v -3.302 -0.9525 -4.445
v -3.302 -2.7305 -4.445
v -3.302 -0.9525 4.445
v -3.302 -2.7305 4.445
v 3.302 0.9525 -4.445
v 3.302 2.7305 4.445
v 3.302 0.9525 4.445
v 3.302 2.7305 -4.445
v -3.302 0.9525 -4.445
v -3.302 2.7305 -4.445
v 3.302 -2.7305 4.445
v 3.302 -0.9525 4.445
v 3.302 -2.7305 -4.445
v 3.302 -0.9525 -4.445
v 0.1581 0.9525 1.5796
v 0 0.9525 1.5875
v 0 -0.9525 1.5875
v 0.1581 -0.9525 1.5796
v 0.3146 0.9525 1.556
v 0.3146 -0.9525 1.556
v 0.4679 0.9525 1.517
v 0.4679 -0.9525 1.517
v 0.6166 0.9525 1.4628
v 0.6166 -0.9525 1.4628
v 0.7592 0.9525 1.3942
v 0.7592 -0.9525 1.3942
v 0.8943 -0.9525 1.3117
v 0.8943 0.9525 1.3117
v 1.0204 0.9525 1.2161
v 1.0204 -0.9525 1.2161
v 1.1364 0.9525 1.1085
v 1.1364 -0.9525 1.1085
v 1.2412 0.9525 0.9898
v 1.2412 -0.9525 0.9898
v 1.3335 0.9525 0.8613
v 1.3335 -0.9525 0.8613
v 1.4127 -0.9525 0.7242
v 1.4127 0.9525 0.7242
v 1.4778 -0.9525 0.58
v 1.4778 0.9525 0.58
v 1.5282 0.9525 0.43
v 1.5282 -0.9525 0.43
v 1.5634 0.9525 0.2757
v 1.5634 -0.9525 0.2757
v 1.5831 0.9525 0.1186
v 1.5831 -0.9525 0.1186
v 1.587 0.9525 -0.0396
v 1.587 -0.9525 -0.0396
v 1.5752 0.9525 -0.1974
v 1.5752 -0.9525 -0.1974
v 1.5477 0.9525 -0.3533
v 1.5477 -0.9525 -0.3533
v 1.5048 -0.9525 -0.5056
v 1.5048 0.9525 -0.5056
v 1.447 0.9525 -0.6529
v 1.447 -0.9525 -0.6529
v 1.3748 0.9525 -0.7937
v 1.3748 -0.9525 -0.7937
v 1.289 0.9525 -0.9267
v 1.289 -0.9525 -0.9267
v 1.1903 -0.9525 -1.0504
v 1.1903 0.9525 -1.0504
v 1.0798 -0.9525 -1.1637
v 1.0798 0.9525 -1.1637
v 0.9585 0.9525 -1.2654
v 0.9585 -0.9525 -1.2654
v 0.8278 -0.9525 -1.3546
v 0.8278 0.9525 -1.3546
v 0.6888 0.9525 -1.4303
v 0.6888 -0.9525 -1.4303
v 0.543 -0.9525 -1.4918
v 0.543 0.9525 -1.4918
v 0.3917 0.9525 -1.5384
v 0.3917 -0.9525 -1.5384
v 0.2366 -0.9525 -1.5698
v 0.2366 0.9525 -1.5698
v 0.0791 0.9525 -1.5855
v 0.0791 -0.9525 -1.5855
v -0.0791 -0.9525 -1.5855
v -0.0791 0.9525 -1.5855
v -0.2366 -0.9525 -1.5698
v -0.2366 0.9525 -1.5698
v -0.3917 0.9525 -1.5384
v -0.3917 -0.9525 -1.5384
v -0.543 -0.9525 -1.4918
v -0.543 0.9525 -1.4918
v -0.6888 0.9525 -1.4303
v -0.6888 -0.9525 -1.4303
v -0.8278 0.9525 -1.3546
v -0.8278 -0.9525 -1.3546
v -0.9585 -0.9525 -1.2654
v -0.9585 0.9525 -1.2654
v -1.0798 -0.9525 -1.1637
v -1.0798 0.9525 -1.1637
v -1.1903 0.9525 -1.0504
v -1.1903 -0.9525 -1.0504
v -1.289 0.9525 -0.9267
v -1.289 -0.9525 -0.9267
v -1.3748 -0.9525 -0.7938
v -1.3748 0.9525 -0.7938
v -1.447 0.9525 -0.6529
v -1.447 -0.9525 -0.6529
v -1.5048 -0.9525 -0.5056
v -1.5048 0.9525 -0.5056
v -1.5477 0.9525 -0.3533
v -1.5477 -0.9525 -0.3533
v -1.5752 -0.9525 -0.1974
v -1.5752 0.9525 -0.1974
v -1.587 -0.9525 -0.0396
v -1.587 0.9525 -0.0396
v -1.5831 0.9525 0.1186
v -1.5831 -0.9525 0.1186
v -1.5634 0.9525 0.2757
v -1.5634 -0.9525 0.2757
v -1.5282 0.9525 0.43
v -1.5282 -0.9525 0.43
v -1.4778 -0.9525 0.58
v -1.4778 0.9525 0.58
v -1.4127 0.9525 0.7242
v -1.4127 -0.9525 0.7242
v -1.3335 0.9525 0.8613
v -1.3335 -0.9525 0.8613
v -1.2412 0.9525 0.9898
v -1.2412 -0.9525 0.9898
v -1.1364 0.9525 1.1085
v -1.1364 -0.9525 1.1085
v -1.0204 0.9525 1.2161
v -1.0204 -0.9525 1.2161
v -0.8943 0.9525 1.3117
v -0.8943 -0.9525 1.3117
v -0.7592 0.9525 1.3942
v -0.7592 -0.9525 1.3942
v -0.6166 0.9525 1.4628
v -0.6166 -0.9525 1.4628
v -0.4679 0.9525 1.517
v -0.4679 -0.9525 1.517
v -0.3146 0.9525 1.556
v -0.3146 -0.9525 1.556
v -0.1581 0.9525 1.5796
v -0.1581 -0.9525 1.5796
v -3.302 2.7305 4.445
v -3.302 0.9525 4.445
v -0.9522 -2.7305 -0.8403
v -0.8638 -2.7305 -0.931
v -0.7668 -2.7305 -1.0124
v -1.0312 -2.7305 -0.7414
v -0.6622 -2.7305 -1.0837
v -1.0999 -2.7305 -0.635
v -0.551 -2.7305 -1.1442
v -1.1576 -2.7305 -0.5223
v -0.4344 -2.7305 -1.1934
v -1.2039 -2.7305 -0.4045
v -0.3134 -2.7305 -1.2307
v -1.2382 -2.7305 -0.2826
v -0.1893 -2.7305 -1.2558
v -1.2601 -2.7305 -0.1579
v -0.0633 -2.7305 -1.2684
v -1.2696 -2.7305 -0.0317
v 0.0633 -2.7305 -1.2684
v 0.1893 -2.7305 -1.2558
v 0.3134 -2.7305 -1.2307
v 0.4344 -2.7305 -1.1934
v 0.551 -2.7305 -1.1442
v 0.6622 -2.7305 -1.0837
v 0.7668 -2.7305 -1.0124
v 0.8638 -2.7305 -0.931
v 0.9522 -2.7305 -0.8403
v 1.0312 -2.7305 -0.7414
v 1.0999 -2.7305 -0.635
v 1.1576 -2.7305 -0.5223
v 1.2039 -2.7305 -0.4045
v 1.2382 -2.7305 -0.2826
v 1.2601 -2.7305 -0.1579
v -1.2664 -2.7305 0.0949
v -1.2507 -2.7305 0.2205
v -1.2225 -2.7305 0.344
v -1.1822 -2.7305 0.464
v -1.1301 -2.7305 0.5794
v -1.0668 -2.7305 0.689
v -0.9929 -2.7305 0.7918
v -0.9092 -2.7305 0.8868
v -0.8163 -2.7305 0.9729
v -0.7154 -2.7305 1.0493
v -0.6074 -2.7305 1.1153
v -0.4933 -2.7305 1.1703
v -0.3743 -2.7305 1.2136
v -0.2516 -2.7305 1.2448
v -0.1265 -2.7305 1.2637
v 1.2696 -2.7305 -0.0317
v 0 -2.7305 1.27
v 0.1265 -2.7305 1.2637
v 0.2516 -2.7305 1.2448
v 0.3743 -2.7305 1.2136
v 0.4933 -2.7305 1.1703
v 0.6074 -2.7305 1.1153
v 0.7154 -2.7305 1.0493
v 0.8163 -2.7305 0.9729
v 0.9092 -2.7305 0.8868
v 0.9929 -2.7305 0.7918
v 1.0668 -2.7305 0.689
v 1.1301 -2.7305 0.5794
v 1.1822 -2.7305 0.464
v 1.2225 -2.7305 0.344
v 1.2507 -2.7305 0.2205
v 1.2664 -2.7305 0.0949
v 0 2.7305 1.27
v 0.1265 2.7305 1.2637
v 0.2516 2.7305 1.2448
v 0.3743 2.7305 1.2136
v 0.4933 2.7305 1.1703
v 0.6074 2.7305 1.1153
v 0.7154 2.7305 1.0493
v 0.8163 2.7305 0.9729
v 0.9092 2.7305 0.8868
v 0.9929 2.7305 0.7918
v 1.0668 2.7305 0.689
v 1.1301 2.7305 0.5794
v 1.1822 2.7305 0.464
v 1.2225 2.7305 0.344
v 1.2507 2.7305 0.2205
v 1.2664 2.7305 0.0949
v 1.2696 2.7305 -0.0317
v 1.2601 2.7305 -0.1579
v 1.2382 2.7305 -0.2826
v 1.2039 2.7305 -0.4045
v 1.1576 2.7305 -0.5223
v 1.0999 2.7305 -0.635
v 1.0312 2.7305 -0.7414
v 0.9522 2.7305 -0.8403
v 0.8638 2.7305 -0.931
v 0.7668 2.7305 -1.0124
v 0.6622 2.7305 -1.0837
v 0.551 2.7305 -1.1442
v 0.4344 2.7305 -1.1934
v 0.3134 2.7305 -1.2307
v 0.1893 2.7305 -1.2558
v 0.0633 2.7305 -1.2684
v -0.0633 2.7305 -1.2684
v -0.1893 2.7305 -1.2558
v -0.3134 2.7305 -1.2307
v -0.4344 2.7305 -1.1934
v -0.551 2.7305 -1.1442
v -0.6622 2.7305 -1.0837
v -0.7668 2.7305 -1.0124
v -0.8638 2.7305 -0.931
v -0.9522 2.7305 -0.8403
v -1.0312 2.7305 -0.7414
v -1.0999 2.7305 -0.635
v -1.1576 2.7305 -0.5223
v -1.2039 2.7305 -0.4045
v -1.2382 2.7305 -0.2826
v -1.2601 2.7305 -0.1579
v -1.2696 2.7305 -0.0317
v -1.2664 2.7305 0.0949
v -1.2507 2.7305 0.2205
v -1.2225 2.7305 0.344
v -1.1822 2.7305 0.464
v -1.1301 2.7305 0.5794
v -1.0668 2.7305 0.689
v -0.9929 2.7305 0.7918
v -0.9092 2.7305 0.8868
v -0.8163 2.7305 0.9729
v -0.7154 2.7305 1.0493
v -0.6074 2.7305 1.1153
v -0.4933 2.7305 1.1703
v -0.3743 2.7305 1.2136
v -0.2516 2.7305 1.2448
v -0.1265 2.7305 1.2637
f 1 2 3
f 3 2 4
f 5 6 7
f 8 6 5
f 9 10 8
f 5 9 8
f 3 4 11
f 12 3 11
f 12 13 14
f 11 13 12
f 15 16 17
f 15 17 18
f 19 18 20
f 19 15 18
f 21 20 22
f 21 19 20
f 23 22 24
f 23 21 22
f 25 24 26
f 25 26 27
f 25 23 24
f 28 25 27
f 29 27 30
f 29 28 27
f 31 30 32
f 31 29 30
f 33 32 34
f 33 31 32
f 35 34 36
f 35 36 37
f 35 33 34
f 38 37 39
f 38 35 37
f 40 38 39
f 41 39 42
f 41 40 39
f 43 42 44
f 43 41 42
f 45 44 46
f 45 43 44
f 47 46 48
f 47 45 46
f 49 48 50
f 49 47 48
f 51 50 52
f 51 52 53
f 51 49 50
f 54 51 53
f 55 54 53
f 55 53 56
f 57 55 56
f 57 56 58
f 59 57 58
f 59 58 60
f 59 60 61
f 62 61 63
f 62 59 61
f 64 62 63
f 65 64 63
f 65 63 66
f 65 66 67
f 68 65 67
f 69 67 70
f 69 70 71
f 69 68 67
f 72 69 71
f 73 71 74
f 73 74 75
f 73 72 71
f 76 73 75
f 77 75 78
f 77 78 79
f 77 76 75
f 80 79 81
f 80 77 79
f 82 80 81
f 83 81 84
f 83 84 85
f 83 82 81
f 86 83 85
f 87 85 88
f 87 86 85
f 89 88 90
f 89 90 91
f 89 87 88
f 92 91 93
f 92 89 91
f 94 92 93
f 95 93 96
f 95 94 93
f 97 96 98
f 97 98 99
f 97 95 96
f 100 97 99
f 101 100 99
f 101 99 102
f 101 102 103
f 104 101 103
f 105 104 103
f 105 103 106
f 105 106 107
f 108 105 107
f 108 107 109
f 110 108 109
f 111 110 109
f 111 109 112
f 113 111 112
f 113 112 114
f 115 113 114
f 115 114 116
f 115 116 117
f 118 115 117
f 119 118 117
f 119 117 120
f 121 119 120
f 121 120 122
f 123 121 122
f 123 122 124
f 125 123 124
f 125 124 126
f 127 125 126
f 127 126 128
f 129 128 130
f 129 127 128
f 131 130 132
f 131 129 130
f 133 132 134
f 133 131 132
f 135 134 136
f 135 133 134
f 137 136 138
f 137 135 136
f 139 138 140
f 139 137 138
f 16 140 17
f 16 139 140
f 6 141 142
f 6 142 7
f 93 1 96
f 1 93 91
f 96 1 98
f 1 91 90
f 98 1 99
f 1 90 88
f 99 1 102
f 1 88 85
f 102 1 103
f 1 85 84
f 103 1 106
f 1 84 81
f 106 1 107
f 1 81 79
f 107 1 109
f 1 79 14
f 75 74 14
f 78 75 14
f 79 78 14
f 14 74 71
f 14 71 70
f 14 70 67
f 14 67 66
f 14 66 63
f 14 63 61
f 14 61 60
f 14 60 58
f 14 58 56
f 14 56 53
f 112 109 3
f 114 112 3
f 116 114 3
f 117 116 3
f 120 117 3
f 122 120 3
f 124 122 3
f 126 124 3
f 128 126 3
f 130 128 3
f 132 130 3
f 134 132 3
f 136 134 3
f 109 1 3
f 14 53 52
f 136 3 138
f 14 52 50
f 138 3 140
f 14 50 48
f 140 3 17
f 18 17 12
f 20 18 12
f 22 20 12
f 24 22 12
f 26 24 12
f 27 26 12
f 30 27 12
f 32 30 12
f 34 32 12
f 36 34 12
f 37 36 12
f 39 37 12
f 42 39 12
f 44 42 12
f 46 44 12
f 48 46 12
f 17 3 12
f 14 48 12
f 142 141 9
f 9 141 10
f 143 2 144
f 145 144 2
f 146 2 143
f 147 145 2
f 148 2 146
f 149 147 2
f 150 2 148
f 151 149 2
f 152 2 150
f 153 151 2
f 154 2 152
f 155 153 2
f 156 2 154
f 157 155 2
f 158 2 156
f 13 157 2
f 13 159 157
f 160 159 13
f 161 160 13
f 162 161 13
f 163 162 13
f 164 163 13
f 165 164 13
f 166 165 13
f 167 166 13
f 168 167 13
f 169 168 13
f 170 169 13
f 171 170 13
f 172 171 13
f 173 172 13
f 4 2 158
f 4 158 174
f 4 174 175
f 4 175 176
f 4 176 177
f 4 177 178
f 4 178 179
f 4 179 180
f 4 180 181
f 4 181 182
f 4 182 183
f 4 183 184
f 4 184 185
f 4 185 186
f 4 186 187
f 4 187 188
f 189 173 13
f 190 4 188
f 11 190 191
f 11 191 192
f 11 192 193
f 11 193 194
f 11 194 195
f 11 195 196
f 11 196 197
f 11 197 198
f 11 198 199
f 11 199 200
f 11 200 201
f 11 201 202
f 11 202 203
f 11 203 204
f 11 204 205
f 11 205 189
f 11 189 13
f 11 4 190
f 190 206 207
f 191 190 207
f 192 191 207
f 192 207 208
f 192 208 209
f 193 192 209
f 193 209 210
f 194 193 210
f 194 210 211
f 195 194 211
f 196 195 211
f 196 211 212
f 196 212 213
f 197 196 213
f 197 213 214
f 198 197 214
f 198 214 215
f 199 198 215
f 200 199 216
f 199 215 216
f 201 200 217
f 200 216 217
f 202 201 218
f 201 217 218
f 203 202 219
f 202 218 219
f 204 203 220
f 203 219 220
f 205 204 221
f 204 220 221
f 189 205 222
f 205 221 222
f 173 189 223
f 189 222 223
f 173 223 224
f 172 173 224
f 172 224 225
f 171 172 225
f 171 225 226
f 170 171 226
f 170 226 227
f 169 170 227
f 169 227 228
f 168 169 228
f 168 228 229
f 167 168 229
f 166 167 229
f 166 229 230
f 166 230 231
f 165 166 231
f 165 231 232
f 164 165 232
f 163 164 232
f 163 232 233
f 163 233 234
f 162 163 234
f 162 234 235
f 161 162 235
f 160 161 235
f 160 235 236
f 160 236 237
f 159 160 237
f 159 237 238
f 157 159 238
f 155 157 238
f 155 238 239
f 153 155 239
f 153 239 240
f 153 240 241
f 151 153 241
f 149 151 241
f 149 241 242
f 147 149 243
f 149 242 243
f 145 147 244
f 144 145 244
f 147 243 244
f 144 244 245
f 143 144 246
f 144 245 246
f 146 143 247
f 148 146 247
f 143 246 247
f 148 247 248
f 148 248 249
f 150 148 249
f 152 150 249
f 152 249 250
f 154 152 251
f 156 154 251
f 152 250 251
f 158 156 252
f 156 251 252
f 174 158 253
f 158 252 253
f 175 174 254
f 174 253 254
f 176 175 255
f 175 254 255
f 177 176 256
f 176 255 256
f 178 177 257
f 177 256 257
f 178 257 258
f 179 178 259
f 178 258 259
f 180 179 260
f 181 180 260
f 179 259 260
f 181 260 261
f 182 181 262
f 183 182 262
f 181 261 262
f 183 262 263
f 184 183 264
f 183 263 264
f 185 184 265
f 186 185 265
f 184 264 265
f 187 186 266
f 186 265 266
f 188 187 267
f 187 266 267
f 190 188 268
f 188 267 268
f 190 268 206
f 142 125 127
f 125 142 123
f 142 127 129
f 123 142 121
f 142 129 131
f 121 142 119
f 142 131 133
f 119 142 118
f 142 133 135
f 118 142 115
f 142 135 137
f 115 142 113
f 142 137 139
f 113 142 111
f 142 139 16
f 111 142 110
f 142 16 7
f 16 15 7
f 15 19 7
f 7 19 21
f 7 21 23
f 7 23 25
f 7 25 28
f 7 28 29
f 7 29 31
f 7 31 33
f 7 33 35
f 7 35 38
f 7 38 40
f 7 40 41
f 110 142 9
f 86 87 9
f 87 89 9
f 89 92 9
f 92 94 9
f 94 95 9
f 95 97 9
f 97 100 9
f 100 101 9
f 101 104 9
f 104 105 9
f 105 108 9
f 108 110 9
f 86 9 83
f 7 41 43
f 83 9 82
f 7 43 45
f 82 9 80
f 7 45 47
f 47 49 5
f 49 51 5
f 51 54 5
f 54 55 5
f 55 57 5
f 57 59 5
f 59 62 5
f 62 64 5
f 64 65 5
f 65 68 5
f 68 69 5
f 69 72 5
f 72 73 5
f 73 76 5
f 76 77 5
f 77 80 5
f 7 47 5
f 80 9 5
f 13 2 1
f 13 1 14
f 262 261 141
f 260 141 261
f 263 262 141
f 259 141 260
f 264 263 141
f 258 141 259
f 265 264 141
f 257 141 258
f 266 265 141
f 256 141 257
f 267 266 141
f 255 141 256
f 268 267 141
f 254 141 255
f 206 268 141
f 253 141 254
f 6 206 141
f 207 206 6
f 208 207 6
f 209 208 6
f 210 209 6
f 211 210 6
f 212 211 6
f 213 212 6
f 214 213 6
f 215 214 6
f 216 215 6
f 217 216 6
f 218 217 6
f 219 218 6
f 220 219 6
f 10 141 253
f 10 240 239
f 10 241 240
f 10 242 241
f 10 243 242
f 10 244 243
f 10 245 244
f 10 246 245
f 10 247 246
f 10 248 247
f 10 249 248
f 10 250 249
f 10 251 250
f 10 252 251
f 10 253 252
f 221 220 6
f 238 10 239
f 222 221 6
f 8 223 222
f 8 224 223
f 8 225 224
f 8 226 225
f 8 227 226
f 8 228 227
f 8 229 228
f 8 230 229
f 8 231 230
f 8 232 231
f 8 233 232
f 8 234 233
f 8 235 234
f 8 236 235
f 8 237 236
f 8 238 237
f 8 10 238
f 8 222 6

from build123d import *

# Parameters (mm, degrees)
SKETCH3_R           = 1.5875
BOSS_EXTRUDE2_DEPTH = 2.7305
SKETCH4_W           = 6.604
SKETCH4_H           = 8.89
BOSS_EXTRUDE3_DEPTH = 1.778
SKETCH5_W           = 6.604
SKETCH5_H           = 8.89
BOSS_EXTRUDE4_DEPTH = 1.778
SKETCH6_R           = 1.27
CUT_EXTRUDE1_DEPTH  = 8.777129933


with BuildPart() as part:
    # Sketch3 → Boss-Extrude2 (new, symmetric)
    with BuildSketch(Plane(origin=(0, 0, 0), x_dir=(1, 0, 0), z_dir=(0, 1, 0))):
        with Locations(Location((0, 0, 0), (0, 0, 270))):
            Circle(SKETCH3_R)
    extrude(amount=BOSS_EXTRUDE2_DEPTH, both=True)

    # Sketch4 → Boss-Extrude3 (add)
    with BuildSketch(Plane.XZ.offset(2.7305)):
        Rectangle(SKETCH4_W, SKETCH4_H)
    extrude(amount=-BOSS_EXTRUDE3_DEPTH)

    # Sketch5 → Boss-Extrude4 (add)
    with BuildSketch(Plane(origin=(0, 2.7305, 0), x_dir=(1, 0, 0), z_dir=(0, 1, 0))):
        Rectangle(SKETCH5_W, SKETCH5_H)
    extrude(amount=-BOSS_EXTRUDE4_DEPTH)

    # Sketch6 → Cut-Extrude1 (cut, through all)
    with BuildSketch(Plane(origin=(0, 2.7305, 0), x_dir=(1, 0, 0), z_dir=(0, 1, 0))):
        with Locations(Location((0, 0, 0), (0, 0, 270))):
            Circle(SKETCH6_R)
    extrude(amount=-CUT_EXTRUDE1_DEPTH, mode=Mode.SUBTRACT)


solid = part.part
